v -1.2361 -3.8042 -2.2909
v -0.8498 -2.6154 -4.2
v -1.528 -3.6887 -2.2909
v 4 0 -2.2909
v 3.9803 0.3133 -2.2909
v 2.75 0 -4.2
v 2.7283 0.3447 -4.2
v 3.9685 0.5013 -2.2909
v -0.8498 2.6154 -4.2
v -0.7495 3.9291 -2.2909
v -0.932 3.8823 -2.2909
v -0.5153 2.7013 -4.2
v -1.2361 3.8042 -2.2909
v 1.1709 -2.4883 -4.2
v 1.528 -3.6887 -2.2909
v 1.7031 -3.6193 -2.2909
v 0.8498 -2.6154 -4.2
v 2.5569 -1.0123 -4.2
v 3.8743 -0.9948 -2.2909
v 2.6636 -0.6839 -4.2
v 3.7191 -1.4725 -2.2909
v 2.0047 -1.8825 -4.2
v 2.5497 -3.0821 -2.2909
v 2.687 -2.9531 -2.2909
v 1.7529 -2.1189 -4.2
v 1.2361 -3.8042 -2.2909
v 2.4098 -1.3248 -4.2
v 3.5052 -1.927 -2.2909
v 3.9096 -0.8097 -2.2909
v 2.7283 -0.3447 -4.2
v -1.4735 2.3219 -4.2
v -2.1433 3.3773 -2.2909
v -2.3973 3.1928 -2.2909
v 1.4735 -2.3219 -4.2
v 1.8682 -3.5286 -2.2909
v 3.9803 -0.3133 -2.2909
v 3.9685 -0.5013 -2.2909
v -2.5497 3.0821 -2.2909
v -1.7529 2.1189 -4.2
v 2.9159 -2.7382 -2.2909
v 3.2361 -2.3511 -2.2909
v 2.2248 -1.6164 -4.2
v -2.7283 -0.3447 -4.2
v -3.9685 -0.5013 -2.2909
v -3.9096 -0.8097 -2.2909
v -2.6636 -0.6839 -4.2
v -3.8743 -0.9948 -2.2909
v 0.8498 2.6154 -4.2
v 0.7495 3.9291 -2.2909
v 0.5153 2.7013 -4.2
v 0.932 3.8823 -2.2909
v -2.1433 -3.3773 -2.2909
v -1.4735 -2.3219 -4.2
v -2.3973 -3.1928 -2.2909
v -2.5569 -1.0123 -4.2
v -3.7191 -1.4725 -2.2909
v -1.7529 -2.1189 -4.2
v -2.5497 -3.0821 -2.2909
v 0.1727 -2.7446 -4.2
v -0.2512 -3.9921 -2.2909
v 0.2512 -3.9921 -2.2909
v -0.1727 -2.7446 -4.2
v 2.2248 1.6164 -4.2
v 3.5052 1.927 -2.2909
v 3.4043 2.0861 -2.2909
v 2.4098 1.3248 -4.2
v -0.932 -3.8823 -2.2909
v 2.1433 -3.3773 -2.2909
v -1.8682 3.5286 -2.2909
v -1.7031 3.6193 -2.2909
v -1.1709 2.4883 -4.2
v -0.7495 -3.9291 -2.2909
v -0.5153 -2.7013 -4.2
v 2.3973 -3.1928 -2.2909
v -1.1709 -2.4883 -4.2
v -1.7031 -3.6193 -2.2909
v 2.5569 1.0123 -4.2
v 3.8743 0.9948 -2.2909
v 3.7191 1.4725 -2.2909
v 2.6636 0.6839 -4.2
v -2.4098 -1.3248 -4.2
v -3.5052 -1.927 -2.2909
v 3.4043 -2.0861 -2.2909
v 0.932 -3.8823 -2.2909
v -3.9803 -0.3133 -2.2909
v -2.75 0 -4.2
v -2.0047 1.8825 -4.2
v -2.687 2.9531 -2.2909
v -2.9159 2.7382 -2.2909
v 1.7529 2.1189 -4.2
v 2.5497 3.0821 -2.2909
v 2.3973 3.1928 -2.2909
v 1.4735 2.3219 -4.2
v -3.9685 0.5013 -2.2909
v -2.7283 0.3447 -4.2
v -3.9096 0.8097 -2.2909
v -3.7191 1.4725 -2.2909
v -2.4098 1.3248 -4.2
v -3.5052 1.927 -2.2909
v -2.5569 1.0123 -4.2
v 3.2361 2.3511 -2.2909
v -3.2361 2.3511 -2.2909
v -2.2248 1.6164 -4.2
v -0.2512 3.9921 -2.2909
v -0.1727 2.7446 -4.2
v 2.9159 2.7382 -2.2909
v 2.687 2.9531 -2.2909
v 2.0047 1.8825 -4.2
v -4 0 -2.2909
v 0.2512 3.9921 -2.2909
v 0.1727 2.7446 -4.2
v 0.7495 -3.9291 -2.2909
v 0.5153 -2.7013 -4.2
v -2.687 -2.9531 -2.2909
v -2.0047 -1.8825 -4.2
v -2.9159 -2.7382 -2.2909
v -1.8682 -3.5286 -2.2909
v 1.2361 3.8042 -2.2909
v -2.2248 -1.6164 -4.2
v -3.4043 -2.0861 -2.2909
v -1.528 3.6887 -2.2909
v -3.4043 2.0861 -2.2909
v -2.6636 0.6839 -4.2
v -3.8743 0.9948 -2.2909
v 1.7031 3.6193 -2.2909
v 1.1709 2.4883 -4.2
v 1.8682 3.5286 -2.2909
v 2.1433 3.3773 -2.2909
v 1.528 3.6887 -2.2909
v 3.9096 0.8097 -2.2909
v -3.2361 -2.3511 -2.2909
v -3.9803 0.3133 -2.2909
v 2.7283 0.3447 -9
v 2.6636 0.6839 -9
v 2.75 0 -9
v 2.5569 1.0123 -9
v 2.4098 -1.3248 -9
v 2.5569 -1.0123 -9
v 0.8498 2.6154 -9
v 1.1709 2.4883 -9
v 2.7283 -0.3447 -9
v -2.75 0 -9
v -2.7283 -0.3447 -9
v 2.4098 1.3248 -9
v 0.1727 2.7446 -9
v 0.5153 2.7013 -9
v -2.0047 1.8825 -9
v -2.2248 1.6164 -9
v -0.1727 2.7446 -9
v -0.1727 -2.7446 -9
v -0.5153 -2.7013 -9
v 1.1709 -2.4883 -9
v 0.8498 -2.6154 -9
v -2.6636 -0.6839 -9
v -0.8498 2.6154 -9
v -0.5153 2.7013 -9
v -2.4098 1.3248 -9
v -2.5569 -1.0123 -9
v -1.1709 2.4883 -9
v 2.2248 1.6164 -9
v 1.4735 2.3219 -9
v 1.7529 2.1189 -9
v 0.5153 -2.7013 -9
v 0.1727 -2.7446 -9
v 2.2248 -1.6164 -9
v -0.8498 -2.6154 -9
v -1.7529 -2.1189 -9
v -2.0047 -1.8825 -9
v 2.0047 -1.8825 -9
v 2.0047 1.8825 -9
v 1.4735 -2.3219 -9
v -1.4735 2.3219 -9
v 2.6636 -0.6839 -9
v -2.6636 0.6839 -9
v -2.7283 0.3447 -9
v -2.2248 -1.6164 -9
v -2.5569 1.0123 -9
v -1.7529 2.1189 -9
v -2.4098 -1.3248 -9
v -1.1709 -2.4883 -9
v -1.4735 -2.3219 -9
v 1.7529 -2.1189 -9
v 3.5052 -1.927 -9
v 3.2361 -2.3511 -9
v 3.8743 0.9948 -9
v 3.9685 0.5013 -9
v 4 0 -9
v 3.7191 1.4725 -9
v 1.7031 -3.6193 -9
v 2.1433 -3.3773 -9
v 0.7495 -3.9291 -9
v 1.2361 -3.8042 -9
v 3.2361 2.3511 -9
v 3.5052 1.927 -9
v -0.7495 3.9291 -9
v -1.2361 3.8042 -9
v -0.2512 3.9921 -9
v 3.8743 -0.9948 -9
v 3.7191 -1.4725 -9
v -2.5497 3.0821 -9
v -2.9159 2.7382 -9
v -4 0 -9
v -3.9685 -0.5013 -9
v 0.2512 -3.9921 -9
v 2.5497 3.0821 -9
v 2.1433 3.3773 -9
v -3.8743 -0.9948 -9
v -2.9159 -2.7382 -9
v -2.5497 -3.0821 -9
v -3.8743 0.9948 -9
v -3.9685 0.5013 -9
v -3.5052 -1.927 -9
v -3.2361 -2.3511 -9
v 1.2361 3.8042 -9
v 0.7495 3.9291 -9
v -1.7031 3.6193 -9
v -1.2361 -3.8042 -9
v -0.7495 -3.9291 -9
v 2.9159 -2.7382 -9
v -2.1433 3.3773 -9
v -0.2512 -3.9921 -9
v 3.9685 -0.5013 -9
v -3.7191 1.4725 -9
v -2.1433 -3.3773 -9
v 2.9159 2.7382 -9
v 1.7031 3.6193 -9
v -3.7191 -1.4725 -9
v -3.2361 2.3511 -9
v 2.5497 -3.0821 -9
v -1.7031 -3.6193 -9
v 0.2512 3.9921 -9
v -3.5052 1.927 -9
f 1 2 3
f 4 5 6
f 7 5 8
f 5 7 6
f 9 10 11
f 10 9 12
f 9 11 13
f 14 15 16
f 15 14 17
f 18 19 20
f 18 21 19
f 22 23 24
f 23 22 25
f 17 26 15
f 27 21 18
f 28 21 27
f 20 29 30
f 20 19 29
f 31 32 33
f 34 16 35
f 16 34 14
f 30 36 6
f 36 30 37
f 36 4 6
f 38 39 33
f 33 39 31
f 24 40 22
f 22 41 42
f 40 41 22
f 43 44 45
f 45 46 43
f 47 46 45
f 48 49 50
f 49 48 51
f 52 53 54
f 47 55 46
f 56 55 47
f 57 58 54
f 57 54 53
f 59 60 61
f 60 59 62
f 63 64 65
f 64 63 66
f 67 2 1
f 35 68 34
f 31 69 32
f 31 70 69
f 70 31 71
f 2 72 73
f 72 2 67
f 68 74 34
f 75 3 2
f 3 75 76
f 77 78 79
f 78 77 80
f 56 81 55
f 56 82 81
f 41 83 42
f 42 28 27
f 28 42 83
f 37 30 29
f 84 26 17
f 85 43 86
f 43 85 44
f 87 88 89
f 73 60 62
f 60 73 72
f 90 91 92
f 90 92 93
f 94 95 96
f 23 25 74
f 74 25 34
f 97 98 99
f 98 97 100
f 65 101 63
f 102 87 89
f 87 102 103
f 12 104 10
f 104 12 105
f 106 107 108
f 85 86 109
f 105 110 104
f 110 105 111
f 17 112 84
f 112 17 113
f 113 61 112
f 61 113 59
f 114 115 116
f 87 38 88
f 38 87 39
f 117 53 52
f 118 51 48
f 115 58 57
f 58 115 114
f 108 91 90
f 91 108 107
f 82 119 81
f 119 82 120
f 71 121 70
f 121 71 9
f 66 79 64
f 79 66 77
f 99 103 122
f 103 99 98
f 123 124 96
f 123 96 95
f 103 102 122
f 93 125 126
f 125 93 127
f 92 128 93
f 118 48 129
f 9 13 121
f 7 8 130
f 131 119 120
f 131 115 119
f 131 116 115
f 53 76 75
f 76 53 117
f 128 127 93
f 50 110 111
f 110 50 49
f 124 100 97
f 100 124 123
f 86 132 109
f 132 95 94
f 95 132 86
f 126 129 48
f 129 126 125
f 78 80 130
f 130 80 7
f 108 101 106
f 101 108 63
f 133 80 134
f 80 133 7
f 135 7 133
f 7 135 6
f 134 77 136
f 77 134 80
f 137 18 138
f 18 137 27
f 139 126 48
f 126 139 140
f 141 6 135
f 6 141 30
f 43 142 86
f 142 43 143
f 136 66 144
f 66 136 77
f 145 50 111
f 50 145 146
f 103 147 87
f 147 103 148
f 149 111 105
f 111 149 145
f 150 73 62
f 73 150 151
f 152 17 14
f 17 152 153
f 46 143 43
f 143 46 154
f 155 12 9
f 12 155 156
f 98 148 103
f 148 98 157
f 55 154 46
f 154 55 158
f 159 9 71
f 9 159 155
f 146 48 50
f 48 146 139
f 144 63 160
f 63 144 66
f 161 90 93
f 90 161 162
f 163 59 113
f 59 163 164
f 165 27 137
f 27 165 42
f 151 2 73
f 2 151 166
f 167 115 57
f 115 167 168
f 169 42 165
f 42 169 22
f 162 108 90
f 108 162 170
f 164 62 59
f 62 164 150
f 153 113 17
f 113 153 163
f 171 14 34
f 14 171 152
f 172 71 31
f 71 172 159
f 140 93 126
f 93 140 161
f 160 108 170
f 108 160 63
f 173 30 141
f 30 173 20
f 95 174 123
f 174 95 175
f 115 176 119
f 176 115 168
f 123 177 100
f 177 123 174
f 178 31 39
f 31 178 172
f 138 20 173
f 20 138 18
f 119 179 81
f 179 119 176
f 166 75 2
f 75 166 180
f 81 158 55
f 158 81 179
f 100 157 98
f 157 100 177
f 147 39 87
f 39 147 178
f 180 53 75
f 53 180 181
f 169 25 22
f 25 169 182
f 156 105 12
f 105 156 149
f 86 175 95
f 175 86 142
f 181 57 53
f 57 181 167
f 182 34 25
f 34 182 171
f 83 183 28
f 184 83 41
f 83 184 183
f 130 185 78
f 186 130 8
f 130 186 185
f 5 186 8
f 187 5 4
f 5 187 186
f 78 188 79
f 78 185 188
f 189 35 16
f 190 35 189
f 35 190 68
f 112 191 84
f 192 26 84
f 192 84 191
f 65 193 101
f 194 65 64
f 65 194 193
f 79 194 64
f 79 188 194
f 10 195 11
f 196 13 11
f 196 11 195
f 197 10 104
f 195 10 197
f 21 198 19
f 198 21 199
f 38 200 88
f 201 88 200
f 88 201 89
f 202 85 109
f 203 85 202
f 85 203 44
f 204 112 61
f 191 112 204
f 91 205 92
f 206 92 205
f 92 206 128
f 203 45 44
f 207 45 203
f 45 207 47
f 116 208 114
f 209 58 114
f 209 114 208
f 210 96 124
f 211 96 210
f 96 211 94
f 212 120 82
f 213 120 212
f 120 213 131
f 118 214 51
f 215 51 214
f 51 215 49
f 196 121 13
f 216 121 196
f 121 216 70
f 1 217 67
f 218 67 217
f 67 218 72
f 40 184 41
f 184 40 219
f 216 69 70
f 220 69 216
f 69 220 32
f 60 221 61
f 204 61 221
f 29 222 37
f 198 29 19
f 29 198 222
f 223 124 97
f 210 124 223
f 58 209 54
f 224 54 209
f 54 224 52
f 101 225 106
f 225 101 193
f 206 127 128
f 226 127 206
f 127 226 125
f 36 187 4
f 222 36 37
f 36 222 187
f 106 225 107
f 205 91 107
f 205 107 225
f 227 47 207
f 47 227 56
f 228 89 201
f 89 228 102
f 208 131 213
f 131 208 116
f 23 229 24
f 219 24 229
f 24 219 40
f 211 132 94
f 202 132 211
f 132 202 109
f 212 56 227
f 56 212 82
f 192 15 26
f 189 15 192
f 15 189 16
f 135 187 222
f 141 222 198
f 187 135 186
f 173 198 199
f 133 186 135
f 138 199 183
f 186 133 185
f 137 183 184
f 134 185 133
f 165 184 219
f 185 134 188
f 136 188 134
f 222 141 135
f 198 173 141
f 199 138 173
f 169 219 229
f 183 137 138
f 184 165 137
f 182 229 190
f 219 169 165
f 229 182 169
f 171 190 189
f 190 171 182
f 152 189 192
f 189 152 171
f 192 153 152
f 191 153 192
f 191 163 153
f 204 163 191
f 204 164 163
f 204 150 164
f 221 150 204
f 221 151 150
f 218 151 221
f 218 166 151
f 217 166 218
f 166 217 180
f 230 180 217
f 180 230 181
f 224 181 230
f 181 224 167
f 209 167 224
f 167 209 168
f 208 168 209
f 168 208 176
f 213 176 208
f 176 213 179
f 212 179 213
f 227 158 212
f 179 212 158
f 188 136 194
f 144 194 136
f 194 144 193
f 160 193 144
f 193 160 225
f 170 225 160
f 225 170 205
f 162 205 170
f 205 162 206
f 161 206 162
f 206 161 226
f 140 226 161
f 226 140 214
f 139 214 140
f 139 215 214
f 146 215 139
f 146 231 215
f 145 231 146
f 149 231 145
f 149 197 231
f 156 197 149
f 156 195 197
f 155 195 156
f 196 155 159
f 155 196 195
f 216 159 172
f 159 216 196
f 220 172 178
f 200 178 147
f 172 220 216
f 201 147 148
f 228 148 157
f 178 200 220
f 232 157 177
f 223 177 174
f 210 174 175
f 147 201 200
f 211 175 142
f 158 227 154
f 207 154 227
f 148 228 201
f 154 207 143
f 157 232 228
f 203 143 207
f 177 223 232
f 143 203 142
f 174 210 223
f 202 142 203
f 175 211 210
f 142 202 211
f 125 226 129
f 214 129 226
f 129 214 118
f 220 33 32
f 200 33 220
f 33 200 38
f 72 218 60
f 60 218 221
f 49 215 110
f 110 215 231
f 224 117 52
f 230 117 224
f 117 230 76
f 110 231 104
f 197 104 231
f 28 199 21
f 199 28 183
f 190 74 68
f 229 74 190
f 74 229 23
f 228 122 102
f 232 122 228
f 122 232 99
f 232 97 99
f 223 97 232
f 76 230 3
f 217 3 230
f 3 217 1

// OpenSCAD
$fn = 50;

difference() {
	union() {
		translate(v = [0, 0, -9.0]) {
			cylinder(h = 9, r = 4.0);
		}
	}
	union() {
		translate(v = [0, 0, 0]) {
			rotate(a = [0, 0, 0]) {
				difference() {
					union() {
						translate(v = [0, 0, -12.0]) {
							cylinder(h = 12, r = 2.25);
						}
						translate(v = [0, 0, -4.2]) {
							cylinder(h = 4.2, r1 = 2.75, r2 = 5.5);
						}
						translate(v = [0, 0, -12.0]) {
							cylinder(h = 12, r = 2.75);
						}
						translate(v = [0, 0, -12.0]) {
							cylinder(h = 12, r = 2.25);
						}
					}
					union();
				}
			}
		}
	}
}
